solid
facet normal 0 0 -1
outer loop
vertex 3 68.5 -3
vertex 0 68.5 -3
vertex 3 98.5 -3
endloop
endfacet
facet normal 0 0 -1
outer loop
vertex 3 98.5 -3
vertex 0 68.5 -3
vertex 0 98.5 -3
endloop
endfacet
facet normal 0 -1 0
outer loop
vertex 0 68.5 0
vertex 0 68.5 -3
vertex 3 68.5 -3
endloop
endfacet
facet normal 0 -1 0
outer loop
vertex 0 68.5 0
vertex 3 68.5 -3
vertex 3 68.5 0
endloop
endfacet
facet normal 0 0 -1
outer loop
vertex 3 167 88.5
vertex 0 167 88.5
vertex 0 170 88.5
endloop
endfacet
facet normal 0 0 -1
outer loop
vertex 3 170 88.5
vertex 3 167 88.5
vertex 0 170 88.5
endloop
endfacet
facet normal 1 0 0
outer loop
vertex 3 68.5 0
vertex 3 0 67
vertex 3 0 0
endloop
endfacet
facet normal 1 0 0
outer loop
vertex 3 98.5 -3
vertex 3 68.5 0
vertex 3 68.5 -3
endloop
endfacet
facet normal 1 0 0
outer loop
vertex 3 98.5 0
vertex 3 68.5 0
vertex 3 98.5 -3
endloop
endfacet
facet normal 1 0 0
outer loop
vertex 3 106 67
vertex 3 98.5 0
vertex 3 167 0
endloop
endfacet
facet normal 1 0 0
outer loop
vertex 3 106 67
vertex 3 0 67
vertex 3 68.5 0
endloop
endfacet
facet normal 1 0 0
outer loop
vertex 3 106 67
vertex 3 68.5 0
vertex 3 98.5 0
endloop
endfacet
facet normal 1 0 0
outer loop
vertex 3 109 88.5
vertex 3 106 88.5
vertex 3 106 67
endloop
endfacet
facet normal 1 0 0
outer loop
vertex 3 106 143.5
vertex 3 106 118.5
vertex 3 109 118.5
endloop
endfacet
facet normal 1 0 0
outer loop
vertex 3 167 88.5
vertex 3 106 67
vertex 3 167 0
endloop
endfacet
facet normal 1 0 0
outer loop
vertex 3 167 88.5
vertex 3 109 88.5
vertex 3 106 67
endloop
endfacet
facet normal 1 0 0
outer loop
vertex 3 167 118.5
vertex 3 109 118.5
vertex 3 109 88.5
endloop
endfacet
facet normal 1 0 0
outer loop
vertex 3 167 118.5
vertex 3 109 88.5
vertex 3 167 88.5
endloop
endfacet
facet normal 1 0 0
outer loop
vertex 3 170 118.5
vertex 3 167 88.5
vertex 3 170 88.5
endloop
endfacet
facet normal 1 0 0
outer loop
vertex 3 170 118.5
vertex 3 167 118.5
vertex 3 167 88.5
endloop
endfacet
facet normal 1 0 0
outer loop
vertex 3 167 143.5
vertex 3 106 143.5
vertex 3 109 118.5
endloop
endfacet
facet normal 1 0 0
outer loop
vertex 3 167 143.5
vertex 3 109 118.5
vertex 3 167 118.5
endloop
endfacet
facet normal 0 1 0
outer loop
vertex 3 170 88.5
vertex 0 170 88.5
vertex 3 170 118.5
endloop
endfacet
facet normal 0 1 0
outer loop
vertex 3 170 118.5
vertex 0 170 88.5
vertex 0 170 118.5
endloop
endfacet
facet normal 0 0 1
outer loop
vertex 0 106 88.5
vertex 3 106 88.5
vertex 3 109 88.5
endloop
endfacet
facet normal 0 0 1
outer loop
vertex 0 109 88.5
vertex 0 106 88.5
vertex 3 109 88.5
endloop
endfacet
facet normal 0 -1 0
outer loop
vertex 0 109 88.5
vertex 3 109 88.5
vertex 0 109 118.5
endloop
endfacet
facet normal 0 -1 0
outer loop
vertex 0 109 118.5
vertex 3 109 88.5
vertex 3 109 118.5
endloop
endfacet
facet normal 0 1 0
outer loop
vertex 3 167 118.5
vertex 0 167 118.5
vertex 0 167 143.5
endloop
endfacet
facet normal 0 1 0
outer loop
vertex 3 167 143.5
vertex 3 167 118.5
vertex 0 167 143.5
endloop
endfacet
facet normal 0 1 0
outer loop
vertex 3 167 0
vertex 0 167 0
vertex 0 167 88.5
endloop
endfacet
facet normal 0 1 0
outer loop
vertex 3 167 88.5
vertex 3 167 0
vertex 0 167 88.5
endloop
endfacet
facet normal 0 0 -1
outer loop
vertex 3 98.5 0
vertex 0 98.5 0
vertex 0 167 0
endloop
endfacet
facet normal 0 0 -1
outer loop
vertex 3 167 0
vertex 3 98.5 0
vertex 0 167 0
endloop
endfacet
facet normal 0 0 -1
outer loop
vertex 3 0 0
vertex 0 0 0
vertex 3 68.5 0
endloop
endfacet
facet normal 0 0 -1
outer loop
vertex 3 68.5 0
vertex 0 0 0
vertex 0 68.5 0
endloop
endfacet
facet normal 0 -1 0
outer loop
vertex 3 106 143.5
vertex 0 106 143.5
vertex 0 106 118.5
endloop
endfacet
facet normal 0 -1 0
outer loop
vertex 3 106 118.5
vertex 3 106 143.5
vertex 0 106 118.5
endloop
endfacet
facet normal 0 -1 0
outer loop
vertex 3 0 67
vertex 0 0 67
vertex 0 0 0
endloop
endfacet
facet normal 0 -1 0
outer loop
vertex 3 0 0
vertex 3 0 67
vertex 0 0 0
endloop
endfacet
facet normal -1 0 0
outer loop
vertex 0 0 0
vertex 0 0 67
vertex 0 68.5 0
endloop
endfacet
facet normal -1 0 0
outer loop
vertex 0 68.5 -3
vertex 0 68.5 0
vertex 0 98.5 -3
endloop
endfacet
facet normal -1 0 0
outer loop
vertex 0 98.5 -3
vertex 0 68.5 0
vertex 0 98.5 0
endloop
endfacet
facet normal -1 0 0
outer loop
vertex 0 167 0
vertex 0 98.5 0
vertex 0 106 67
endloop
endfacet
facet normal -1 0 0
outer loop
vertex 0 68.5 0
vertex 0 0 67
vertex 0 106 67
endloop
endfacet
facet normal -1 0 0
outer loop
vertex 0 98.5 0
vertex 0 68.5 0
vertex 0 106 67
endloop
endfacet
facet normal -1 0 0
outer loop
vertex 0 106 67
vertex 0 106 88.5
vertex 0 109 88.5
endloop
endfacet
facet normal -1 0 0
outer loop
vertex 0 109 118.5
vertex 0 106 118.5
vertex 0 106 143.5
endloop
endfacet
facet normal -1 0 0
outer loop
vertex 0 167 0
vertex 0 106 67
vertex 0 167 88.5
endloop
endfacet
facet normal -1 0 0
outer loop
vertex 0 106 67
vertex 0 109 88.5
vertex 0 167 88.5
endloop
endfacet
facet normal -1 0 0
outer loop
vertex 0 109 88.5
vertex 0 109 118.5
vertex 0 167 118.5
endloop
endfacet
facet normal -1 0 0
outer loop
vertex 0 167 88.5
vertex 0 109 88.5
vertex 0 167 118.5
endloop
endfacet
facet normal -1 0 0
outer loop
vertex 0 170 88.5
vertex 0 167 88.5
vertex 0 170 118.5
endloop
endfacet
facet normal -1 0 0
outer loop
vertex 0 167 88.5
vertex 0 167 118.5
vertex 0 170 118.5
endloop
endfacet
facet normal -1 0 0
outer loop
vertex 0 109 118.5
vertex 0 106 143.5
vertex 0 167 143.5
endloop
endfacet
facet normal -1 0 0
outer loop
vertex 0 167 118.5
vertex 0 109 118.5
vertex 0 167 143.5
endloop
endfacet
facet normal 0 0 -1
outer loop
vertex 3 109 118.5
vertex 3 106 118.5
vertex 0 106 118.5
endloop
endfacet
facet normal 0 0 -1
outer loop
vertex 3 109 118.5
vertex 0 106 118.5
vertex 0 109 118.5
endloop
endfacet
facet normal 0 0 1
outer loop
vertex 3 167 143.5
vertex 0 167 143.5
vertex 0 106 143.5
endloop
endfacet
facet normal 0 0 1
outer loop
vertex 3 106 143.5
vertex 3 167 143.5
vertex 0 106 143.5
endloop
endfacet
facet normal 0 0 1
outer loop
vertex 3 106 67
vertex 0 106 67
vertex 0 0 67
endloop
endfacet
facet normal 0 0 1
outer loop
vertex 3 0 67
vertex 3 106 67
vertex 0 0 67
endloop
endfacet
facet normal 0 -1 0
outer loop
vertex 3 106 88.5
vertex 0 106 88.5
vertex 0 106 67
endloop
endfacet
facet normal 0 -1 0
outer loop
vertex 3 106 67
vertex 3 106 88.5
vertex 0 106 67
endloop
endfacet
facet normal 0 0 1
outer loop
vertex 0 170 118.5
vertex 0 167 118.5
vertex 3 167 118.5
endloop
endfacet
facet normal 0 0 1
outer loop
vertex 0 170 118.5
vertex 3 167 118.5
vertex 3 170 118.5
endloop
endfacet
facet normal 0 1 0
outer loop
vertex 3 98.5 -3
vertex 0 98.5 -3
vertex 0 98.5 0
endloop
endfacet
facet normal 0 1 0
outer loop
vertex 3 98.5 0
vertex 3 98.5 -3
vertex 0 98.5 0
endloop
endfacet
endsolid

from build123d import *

# Parameters (mm, degrees)
F0_W     = 30
F0_H     = 3
F0_W_2   = 3
F0_H_2   = 30
F1_DEPTH = 3
F2_W     = 3
F2_H     = 30
F3_DEPTH = 25


with BuildPart() as f1:
    # F0 (on Right) → F1 (new body)
    with BuildSketch(Plane.YZ):
        Polygon((0, 67), (0, 0), (68.5, 0), (98.5, 0), (167, 0), (167, 88.5), (167, 118.5), (167, 143.5), (106, 143.5), (106, 67), align=None)
        with Locations((83.5, -1.5)):
            Rectangle(F0_W, F0_H)
        with Locations((168.5, 103.5)):
            Rectangle(F0_W_2, F0_H_2)
    extrude(amount=F1_DEPTH)

    # F2 (on face) → F3 (cut)
    with BuildSketch(Plane.YZ.offset(3)):
        with Locations((107.5, 103.5)):
            Rectangle(F2_W, F2_H)
    extrude(amount=-F3_DEPTH, mode=Mode.SUBTRACT)


solid = f1.part
